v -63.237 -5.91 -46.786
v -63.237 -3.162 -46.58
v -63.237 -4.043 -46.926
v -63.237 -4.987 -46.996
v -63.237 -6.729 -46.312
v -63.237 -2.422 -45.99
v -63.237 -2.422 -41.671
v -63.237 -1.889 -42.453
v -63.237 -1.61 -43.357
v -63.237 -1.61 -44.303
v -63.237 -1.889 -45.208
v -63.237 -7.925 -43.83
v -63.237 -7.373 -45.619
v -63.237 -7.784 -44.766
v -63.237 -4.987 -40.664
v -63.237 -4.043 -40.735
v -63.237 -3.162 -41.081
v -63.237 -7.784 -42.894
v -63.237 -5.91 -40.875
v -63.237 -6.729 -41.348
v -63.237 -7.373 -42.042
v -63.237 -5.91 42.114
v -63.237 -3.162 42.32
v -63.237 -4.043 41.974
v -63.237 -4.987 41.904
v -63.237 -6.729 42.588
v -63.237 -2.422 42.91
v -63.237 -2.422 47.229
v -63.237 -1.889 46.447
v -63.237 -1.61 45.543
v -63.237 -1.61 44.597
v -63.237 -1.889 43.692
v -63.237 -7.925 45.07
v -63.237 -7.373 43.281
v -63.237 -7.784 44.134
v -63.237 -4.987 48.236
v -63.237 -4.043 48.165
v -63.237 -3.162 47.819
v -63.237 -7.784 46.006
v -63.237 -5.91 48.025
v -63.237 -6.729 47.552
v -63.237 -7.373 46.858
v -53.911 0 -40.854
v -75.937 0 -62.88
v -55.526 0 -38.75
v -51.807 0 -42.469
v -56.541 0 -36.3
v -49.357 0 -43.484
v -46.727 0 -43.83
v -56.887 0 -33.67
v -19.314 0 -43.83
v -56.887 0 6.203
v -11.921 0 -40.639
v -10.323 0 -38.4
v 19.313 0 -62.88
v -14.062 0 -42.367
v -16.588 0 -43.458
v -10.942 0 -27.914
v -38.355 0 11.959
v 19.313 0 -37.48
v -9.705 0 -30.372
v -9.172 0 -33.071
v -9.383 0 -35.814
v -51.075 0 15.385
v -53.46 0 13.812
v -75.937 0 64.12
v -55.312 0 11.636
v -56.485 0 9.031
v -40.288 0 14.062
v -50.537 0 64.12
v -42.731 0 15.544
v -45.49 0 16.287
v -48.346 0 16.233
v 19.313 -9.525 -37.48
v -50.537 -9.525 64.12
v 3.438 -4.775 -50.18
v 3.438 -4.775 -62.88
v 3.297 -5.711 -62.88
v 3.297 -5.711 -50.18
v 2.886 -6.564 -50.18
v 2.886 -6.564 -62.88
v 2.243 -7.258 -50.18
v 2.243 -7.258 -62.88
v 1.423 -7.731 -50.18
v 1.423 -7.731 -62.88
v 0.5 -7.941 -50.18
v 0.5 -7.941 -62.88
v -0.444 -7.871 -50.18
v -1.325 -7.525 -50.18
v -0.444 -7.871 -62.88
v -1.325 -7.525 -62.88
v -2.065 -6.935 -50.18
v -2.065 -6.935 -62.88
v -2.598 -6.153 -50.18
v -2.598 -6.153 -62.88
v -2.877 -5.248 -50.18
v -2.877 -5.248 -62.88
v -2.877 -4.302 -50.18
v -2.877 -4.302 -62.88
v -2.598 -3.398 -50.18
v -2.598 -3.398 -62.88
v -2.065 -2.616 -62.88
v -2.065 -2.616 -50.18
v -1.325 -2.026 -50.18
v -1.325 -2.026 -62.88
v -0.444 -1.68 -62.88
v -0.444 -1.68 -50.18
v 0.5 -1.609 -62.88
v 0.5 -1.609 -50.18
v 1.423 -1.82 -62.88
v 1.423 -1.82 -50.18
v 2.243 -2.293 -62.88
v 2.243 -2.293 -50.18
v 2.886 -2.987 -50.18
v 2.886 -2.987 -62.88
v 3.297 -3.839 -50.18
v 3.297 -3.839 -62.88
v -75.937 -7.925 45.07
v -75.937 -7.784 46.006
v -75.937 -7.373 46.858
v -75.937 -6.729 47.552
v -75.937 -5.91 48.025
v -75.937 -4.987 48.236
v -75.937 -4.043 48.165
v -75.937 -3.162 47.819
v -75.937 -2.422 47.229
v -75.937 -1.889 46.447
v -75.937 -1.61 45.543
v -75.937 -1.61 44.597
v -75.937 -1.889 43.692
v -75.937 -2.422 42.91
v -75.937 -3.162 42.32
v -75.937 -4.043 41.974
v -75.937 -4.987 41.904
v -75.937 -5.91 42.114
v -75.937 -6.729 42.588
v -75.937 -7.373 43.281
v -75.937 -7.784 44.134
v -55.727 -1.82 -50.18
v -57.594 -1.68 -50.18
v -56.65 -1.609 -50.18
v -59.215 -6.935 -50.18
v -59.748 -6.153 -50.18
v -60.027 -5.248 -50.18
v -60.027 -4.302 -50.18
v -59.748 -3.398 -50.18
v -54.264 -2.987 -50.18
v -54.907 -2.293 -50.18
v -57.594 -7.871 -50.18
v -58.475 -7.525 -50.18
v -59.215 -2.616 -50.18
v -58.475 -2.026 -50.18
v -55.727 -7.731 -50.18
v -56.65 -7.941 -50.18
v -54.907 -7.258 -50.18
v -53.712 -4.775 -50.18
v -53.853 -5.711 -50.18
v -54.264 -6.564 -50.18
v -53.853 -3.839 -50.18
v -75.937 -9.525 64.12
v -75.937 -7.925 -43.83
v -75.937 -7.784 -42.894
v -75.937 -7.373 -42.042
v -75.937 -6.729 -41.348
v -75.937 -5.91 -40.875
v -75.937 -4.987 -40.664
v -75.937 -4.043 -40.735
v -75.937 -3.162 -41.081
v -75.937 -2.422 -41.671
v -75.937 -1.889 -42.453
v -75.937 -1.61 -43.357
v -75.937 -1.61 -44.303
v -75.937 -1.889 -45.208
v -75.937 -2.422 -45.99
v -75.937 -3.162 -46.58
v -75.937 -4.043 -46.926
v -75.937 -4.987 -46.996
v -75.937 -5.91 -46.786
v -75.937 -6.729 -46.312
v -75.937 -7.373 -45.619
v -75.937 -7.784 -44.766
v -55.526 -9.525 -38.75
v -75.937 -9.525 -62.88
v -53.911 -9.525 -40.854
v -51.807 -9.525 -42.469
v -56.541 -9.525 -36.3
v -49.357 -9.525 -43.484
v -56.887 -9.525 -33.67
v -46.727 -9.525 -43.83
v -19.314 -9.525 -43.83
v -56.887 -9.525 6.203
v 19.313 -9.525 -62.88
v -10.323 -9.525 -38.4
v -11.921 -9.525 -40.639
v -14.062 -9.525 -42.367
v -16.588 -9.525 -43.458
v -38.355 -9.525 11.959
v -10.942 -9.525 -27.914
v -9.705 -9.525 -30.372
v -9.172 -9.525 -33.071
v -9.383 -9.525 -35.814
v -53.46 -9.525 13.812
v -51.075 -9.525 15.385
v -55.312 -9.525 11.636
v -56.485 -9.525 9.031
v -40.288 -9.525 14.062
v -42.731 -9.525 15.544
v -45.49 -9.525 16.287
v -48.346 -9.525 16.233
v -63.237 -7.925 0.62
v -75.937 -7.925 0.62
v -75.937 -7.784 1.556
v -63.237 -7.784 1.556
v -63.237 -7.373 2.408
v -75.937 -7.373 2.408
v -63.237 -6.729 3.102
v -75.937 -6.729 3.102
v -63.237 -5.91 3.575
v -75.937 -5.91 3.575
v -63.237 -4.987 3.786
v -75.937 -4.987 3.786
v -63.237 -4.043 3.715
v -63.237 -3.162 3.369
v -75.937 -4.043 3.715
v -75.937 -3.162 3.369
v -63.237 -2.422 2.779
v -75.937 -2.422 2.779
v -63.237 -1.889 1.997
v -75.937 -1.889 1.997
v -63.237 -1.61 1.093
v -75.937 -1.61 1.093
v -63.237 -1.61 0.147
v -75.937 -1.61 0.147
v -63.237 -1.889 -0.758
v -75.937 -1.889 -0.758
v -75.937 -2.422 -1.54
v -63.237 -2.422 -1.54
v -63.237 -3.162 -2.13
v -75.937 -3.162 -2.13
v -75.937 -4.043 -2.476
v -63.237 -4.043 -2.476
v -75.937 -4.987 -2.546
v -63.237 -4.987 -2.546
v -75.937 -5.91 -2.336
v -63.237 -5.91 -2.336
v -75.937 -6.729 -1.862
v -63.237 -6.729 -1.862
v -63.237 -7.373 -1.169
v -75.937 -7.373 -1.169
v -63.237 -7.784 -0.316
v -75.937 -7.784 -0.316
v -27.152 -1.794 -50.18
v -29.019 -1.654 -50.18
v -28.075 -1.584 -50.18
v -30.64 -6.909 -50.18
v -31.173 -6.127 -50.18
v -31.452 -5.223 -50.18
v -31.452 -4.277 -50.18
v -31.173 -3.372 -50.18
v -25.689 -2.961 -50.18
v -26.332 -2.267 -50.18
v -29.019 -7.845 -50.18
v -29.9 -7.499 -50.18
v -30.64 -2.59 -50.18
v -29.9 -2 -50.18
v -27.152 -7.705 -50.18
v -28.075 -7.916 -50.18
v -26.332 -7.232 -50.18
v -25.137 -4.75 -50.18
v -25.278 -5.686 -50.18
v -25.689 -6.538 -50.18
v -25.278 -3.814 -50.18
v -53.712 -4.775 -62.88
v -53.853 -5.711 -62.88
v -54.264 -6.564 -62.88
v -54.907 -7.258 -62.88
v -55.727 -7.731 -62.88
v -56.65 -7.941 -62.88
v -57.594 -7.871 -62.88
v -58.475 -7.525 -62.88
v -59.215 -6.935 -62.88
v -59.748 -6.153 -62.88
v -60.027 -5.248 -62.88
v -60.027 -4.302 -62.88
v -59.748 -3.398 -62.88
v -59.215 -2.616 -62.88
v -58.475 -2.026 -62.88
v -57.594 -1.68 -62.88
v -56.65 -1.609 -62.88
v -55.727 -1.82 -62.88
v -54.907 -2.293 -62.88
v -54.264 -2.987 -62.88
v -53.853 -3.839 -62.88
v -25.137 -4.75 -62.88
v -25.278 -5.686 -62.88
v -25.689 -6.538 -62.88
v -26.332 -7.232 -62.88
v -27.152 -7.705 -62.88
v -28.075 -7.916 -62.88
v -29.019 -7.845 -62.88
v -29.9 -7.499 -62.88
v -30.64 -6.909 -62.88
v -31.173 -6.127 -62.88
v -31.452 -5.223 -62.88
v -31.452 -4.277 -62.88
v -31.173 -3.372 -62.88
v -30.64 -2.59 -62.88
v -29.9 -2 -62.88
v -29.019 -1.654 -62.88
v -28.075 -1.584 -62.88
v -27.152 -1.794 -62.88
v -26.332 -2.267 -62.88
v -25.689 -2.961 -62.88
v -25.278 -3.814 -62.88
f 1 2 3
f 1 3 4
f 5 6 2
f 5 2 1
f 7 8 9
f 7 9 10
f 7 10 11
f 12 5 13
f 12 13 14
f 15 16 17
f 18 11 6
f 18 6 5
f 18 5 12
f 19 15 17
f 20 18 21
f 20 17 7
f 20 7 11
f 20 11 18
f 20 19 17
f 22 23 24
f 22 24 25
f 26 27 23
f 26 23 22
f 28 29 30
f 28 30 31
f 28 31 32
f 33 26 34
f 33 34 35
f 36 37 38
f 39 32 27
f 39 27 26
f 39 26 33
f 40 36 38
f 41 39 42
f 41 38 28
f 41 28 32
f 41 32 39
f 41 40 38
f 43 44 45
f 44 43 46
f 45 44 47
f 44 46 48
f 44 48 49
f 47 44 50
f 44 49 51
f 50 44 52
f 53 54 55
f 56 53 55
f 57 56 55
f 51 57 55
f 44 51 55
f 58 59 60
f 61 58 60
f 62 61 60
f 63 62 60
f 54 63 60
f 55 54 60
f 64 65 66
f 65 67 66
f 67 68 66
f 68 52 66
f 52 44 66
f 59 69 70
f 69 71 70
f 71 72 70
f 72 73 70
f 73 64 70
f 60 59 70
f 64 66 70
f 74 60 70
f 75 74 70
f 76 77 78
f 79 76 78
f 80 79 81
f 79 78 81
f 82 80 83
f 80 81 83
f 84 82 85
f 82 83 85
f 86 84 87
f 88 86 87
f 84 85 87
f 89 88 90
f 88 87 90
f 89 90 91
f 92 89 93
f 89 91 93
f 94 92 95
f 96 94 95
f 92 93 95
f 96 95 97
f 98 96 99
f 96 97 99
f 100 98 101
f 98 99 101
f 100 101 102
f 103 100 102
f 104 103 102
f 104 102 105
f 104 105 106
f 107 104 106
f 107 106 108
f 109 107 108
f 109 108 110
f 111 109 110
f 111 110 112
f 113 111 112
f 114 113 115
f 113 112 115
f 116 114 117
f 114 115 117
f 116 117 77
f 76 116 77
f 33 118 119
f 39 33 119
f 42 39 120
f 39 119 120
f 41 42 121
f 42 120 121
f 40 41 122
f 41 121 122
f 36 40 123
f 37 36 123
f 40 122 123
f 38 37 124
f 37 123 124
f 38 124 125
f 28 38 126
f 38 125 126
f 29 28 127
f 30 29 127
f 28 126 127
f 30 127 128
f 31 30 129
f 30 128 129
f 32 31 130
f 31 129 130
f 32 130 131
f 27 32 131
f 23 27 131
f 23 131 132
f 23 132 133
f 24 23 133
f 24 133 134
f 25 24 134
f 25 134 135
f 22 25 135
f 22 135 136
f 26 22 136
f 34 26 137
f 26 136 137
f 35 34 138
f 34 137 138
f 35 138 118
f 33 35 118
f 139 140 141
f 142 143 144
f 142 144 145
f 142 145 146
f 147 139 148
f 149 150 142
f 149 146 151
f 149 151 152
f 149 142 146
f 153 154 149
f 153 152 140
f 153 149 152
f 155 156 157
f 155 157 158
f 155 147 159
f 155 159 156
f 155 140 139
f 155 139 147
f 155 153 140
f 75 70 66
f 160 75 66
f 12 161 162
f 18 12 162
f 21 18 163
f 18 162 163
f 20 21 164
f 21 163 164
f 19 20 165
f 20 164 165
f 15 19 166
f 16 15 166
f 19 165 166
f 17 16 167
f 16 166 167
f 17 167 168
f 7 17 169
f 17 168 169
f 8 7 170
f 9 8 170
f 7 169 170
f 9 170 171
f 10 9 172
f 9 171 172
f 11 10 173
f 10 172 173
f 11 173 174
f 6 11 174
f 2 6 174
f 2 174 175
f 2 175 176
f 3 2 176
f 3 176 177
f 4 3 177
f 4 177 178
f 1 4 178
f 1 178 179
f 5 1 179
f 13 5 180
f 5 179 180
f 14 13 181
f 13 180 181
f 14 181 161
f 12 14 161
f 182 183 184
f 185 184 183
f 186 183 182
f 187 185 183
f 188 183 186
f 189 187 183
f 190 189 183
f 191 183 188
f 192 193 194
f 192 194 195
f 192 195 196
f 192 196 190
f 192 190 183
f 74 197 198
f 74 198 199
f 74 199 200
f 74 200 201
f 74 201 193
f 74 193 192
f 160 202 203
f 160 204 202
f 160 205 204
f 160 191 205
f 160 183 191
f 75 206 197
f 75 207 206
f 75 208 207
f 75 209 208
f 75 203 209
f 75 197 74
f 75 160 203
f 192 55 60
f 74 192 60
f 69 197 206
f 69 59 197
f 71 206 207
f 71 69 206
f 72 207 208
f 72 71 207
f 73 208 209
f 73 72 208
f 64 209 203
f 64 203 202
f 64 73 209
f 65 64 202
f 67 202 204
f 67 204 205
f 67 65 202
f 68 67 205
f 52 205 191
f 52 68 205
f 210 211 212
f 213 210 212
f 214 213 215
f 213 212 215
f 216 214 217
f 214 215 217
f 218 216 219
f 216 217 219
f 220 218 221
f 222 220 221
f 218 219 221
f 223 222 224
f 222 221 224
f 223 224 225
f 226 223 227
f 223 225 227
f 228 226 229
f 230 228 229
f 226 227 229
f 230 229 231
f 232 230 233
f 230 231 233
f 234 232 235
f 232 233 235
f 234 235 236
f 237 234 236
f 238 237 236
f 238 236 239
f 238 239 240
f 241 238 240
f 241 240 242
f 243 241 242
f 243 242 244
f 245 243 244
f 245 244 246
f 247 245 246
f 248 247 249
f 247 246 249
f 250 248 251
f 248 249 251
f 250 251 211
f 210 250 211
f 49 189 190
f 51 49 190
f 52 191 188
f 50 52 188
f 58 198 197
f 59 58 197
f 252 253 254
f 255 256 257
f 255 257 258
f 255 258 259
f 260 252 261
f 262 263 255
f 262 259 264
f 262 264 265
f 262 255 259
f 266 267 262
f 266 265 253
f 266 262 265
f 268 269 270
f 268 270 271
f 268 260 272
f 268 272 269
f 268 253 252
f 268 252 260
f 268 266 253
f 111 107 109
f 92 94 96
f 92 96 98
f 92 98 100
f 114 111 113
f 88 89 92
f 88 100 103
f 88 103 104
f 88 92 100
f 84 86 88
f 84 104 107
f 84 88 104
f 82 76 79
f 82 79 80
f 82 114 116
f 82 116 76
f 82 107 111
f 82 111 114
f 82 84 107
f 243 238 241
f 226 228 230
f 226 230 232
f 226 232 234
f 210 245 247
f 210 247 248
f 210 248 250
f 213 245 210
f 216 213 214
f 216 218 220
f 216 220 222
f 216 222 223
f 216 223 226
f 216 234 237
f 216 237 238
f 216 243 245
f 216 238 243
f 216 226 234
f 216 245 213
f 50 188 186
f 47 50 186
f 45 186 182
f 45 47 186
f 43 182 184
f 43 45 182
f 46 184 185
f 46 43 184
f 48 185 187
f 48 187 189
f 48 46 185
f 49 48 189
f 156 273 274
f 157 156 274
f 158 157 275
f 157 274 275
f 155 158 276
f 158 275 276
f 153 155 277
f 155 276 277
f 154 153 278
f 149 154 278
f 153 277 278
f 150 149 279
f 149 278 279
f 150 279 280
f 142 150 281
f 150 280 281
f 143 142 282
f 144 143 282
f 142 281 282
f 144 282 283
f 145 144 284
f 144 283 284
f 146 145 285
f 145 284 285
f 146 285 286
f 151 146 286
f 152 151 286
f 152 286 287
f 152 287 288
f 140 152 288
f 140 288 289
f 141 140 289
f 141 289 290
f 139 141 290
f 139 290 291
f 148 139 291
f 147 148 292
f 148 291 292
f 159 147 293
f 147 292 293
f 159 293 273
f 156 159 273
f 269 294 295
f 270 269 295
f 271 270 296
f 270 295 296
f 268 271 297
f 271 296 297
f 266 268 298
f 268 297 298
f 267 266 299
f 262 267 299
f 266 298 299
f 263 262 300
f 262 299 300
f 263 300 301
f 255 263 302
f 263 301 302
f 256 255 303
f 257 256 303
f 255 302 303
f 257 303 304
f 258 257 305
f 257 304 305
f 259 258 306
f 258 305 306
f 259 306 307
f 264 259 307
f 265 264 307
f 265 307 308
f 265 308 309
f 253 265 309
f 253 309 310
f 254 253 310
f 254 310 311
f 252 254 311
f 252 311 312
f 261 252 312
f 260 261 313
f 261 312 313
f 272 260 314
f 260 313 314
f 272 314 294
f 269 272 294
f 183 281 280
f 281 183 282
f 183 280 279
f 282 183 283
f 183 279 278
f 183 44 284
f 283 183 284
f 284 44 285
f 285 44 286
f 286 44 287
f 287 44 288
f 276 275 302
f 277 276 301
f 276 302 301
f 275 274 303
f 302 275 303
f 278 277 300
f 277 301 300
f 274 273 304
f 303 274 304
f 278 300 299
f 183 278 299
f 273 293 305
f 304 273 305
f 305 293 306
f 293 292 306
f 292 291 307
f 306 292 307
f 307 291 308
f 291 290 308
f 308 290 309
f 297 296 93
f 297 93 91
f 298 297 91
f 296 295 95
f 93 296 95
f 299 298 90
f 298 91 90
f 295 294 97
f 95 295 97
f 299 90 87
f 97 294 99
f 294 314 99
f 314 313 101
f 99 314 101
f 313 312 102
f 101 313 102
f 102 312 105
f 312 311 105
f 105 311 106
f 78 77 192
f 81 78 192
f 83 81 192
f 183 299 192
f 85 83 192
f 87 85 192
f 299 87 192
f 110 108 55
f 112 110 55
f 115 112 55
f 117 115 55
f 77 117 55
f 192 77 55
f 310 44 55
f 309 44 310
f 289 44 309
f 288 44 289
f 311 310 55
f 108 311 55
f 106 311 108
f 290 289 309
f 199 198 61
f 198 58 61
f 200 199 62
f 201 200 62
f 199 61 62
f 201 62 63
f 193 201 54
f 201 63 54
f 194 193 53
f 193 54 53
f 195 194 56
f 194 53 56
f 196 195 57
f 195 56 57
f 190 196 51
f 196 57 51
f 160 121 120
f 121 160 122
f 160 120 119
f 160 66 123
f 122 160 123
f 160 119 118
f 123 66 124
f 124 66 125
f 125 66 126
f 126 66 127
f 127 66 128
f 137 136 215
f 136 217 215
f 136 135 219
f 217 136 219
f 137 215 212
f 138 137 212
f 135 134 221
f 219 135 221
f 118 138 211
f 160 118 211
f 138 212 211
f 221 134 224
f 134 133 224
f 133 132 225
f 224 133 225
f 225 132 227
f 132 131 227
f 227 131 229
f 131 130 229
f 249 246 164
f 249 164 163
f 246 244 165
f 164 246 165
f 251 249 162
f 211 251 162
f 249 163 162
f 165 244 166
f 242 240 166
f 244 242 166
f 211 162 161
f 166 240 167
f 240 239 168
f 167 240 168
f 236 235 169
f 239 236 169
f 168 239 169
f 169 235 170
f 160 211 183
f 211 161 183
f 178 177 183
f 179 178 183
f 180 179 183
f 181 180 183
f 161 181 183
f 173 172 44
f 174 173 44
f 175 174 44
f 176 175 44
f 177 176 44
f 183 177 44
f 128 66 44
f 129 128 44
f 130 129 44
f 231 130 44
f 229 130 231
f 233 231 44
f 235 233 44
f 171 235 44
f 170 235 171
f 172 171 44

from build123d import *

# Parameters (mm, degrees)
F1_DEPTH = 9.525
F3_DEPTH = 9.526
F4_R     = 10.16
F5_R     = 3.175
F6_DEPTH = 12.7
F7_R     = 3.175
F8_DEPTH = 12.7


with BuildPart() as f1:
    # F0 (on Front) → F1 (new body)
    with BuildSketch(Plane.XZ):
        Polygon((-50.537063, 64.119838), (-75.937063, 64.119838), (-75.937063, -62.880162), (19.312937, -62.880162), (19.312937, -37.480162), align=None)
    extrude(amount=F1_DEPTH)

    # F2 (on face) → F3 (cut, through all)
    with BuildSketch(Plane.XZ.offset(9.525)):
        Polygon((0, -43.830162), (-56.887063, 38.914657), (-56.887063, -43.830162), align=None)
    extrude(amount=-F3_DEPTH, mode=Mode.SUBTRACT)

    # F4
    f4_edges = [f1.edges().sort_by_distance(p)[0] for p in [
        (-56.887063, -4.7625, -43.830162),
        (0, -4.7625, -43.830162),
        (-56.887063, -4.7625, 38.914657),
    ]]
    fillet(f4_edges, radius=F4_R)

    # F5 (on face) → F6 (cut)
    with BuildSketch(Plane(origin=(0, 0, -62.880162), x_dir=(1, 0, 0), z_dir=(0, 0, -1))):
        with Locations((-56.887063, 4.7752)):
            Circle(F5_R)
        with Locations((-28.312063, 4.7498)):
            Circle(F5_R)
        with Locations((0.262937, 4.7752)):
            Circle(F5_R)
    extrude(amount=-F6_DEPTH, mode=Mode.SUBTRACT)

    # F7 (on face) → F8 (cut)
    with BuildSketch(Plane(origin=(-75.937063, 0, 0), x_dir=(0, -1, 0), z_dir=(-1, 0, 0))):
        with Locations((4.7498, 45.069838)):
            Circle(F7_R)
        with Locations((4.7498, 0.619838)):
            Circle(F7_R)
        with Locations((4.7498, -43.830162)):
            Circle(F7_R)
    extrude(amount=-F8_DEPTH, mode=Mode.SUBTRACT)


solid = f1.part
